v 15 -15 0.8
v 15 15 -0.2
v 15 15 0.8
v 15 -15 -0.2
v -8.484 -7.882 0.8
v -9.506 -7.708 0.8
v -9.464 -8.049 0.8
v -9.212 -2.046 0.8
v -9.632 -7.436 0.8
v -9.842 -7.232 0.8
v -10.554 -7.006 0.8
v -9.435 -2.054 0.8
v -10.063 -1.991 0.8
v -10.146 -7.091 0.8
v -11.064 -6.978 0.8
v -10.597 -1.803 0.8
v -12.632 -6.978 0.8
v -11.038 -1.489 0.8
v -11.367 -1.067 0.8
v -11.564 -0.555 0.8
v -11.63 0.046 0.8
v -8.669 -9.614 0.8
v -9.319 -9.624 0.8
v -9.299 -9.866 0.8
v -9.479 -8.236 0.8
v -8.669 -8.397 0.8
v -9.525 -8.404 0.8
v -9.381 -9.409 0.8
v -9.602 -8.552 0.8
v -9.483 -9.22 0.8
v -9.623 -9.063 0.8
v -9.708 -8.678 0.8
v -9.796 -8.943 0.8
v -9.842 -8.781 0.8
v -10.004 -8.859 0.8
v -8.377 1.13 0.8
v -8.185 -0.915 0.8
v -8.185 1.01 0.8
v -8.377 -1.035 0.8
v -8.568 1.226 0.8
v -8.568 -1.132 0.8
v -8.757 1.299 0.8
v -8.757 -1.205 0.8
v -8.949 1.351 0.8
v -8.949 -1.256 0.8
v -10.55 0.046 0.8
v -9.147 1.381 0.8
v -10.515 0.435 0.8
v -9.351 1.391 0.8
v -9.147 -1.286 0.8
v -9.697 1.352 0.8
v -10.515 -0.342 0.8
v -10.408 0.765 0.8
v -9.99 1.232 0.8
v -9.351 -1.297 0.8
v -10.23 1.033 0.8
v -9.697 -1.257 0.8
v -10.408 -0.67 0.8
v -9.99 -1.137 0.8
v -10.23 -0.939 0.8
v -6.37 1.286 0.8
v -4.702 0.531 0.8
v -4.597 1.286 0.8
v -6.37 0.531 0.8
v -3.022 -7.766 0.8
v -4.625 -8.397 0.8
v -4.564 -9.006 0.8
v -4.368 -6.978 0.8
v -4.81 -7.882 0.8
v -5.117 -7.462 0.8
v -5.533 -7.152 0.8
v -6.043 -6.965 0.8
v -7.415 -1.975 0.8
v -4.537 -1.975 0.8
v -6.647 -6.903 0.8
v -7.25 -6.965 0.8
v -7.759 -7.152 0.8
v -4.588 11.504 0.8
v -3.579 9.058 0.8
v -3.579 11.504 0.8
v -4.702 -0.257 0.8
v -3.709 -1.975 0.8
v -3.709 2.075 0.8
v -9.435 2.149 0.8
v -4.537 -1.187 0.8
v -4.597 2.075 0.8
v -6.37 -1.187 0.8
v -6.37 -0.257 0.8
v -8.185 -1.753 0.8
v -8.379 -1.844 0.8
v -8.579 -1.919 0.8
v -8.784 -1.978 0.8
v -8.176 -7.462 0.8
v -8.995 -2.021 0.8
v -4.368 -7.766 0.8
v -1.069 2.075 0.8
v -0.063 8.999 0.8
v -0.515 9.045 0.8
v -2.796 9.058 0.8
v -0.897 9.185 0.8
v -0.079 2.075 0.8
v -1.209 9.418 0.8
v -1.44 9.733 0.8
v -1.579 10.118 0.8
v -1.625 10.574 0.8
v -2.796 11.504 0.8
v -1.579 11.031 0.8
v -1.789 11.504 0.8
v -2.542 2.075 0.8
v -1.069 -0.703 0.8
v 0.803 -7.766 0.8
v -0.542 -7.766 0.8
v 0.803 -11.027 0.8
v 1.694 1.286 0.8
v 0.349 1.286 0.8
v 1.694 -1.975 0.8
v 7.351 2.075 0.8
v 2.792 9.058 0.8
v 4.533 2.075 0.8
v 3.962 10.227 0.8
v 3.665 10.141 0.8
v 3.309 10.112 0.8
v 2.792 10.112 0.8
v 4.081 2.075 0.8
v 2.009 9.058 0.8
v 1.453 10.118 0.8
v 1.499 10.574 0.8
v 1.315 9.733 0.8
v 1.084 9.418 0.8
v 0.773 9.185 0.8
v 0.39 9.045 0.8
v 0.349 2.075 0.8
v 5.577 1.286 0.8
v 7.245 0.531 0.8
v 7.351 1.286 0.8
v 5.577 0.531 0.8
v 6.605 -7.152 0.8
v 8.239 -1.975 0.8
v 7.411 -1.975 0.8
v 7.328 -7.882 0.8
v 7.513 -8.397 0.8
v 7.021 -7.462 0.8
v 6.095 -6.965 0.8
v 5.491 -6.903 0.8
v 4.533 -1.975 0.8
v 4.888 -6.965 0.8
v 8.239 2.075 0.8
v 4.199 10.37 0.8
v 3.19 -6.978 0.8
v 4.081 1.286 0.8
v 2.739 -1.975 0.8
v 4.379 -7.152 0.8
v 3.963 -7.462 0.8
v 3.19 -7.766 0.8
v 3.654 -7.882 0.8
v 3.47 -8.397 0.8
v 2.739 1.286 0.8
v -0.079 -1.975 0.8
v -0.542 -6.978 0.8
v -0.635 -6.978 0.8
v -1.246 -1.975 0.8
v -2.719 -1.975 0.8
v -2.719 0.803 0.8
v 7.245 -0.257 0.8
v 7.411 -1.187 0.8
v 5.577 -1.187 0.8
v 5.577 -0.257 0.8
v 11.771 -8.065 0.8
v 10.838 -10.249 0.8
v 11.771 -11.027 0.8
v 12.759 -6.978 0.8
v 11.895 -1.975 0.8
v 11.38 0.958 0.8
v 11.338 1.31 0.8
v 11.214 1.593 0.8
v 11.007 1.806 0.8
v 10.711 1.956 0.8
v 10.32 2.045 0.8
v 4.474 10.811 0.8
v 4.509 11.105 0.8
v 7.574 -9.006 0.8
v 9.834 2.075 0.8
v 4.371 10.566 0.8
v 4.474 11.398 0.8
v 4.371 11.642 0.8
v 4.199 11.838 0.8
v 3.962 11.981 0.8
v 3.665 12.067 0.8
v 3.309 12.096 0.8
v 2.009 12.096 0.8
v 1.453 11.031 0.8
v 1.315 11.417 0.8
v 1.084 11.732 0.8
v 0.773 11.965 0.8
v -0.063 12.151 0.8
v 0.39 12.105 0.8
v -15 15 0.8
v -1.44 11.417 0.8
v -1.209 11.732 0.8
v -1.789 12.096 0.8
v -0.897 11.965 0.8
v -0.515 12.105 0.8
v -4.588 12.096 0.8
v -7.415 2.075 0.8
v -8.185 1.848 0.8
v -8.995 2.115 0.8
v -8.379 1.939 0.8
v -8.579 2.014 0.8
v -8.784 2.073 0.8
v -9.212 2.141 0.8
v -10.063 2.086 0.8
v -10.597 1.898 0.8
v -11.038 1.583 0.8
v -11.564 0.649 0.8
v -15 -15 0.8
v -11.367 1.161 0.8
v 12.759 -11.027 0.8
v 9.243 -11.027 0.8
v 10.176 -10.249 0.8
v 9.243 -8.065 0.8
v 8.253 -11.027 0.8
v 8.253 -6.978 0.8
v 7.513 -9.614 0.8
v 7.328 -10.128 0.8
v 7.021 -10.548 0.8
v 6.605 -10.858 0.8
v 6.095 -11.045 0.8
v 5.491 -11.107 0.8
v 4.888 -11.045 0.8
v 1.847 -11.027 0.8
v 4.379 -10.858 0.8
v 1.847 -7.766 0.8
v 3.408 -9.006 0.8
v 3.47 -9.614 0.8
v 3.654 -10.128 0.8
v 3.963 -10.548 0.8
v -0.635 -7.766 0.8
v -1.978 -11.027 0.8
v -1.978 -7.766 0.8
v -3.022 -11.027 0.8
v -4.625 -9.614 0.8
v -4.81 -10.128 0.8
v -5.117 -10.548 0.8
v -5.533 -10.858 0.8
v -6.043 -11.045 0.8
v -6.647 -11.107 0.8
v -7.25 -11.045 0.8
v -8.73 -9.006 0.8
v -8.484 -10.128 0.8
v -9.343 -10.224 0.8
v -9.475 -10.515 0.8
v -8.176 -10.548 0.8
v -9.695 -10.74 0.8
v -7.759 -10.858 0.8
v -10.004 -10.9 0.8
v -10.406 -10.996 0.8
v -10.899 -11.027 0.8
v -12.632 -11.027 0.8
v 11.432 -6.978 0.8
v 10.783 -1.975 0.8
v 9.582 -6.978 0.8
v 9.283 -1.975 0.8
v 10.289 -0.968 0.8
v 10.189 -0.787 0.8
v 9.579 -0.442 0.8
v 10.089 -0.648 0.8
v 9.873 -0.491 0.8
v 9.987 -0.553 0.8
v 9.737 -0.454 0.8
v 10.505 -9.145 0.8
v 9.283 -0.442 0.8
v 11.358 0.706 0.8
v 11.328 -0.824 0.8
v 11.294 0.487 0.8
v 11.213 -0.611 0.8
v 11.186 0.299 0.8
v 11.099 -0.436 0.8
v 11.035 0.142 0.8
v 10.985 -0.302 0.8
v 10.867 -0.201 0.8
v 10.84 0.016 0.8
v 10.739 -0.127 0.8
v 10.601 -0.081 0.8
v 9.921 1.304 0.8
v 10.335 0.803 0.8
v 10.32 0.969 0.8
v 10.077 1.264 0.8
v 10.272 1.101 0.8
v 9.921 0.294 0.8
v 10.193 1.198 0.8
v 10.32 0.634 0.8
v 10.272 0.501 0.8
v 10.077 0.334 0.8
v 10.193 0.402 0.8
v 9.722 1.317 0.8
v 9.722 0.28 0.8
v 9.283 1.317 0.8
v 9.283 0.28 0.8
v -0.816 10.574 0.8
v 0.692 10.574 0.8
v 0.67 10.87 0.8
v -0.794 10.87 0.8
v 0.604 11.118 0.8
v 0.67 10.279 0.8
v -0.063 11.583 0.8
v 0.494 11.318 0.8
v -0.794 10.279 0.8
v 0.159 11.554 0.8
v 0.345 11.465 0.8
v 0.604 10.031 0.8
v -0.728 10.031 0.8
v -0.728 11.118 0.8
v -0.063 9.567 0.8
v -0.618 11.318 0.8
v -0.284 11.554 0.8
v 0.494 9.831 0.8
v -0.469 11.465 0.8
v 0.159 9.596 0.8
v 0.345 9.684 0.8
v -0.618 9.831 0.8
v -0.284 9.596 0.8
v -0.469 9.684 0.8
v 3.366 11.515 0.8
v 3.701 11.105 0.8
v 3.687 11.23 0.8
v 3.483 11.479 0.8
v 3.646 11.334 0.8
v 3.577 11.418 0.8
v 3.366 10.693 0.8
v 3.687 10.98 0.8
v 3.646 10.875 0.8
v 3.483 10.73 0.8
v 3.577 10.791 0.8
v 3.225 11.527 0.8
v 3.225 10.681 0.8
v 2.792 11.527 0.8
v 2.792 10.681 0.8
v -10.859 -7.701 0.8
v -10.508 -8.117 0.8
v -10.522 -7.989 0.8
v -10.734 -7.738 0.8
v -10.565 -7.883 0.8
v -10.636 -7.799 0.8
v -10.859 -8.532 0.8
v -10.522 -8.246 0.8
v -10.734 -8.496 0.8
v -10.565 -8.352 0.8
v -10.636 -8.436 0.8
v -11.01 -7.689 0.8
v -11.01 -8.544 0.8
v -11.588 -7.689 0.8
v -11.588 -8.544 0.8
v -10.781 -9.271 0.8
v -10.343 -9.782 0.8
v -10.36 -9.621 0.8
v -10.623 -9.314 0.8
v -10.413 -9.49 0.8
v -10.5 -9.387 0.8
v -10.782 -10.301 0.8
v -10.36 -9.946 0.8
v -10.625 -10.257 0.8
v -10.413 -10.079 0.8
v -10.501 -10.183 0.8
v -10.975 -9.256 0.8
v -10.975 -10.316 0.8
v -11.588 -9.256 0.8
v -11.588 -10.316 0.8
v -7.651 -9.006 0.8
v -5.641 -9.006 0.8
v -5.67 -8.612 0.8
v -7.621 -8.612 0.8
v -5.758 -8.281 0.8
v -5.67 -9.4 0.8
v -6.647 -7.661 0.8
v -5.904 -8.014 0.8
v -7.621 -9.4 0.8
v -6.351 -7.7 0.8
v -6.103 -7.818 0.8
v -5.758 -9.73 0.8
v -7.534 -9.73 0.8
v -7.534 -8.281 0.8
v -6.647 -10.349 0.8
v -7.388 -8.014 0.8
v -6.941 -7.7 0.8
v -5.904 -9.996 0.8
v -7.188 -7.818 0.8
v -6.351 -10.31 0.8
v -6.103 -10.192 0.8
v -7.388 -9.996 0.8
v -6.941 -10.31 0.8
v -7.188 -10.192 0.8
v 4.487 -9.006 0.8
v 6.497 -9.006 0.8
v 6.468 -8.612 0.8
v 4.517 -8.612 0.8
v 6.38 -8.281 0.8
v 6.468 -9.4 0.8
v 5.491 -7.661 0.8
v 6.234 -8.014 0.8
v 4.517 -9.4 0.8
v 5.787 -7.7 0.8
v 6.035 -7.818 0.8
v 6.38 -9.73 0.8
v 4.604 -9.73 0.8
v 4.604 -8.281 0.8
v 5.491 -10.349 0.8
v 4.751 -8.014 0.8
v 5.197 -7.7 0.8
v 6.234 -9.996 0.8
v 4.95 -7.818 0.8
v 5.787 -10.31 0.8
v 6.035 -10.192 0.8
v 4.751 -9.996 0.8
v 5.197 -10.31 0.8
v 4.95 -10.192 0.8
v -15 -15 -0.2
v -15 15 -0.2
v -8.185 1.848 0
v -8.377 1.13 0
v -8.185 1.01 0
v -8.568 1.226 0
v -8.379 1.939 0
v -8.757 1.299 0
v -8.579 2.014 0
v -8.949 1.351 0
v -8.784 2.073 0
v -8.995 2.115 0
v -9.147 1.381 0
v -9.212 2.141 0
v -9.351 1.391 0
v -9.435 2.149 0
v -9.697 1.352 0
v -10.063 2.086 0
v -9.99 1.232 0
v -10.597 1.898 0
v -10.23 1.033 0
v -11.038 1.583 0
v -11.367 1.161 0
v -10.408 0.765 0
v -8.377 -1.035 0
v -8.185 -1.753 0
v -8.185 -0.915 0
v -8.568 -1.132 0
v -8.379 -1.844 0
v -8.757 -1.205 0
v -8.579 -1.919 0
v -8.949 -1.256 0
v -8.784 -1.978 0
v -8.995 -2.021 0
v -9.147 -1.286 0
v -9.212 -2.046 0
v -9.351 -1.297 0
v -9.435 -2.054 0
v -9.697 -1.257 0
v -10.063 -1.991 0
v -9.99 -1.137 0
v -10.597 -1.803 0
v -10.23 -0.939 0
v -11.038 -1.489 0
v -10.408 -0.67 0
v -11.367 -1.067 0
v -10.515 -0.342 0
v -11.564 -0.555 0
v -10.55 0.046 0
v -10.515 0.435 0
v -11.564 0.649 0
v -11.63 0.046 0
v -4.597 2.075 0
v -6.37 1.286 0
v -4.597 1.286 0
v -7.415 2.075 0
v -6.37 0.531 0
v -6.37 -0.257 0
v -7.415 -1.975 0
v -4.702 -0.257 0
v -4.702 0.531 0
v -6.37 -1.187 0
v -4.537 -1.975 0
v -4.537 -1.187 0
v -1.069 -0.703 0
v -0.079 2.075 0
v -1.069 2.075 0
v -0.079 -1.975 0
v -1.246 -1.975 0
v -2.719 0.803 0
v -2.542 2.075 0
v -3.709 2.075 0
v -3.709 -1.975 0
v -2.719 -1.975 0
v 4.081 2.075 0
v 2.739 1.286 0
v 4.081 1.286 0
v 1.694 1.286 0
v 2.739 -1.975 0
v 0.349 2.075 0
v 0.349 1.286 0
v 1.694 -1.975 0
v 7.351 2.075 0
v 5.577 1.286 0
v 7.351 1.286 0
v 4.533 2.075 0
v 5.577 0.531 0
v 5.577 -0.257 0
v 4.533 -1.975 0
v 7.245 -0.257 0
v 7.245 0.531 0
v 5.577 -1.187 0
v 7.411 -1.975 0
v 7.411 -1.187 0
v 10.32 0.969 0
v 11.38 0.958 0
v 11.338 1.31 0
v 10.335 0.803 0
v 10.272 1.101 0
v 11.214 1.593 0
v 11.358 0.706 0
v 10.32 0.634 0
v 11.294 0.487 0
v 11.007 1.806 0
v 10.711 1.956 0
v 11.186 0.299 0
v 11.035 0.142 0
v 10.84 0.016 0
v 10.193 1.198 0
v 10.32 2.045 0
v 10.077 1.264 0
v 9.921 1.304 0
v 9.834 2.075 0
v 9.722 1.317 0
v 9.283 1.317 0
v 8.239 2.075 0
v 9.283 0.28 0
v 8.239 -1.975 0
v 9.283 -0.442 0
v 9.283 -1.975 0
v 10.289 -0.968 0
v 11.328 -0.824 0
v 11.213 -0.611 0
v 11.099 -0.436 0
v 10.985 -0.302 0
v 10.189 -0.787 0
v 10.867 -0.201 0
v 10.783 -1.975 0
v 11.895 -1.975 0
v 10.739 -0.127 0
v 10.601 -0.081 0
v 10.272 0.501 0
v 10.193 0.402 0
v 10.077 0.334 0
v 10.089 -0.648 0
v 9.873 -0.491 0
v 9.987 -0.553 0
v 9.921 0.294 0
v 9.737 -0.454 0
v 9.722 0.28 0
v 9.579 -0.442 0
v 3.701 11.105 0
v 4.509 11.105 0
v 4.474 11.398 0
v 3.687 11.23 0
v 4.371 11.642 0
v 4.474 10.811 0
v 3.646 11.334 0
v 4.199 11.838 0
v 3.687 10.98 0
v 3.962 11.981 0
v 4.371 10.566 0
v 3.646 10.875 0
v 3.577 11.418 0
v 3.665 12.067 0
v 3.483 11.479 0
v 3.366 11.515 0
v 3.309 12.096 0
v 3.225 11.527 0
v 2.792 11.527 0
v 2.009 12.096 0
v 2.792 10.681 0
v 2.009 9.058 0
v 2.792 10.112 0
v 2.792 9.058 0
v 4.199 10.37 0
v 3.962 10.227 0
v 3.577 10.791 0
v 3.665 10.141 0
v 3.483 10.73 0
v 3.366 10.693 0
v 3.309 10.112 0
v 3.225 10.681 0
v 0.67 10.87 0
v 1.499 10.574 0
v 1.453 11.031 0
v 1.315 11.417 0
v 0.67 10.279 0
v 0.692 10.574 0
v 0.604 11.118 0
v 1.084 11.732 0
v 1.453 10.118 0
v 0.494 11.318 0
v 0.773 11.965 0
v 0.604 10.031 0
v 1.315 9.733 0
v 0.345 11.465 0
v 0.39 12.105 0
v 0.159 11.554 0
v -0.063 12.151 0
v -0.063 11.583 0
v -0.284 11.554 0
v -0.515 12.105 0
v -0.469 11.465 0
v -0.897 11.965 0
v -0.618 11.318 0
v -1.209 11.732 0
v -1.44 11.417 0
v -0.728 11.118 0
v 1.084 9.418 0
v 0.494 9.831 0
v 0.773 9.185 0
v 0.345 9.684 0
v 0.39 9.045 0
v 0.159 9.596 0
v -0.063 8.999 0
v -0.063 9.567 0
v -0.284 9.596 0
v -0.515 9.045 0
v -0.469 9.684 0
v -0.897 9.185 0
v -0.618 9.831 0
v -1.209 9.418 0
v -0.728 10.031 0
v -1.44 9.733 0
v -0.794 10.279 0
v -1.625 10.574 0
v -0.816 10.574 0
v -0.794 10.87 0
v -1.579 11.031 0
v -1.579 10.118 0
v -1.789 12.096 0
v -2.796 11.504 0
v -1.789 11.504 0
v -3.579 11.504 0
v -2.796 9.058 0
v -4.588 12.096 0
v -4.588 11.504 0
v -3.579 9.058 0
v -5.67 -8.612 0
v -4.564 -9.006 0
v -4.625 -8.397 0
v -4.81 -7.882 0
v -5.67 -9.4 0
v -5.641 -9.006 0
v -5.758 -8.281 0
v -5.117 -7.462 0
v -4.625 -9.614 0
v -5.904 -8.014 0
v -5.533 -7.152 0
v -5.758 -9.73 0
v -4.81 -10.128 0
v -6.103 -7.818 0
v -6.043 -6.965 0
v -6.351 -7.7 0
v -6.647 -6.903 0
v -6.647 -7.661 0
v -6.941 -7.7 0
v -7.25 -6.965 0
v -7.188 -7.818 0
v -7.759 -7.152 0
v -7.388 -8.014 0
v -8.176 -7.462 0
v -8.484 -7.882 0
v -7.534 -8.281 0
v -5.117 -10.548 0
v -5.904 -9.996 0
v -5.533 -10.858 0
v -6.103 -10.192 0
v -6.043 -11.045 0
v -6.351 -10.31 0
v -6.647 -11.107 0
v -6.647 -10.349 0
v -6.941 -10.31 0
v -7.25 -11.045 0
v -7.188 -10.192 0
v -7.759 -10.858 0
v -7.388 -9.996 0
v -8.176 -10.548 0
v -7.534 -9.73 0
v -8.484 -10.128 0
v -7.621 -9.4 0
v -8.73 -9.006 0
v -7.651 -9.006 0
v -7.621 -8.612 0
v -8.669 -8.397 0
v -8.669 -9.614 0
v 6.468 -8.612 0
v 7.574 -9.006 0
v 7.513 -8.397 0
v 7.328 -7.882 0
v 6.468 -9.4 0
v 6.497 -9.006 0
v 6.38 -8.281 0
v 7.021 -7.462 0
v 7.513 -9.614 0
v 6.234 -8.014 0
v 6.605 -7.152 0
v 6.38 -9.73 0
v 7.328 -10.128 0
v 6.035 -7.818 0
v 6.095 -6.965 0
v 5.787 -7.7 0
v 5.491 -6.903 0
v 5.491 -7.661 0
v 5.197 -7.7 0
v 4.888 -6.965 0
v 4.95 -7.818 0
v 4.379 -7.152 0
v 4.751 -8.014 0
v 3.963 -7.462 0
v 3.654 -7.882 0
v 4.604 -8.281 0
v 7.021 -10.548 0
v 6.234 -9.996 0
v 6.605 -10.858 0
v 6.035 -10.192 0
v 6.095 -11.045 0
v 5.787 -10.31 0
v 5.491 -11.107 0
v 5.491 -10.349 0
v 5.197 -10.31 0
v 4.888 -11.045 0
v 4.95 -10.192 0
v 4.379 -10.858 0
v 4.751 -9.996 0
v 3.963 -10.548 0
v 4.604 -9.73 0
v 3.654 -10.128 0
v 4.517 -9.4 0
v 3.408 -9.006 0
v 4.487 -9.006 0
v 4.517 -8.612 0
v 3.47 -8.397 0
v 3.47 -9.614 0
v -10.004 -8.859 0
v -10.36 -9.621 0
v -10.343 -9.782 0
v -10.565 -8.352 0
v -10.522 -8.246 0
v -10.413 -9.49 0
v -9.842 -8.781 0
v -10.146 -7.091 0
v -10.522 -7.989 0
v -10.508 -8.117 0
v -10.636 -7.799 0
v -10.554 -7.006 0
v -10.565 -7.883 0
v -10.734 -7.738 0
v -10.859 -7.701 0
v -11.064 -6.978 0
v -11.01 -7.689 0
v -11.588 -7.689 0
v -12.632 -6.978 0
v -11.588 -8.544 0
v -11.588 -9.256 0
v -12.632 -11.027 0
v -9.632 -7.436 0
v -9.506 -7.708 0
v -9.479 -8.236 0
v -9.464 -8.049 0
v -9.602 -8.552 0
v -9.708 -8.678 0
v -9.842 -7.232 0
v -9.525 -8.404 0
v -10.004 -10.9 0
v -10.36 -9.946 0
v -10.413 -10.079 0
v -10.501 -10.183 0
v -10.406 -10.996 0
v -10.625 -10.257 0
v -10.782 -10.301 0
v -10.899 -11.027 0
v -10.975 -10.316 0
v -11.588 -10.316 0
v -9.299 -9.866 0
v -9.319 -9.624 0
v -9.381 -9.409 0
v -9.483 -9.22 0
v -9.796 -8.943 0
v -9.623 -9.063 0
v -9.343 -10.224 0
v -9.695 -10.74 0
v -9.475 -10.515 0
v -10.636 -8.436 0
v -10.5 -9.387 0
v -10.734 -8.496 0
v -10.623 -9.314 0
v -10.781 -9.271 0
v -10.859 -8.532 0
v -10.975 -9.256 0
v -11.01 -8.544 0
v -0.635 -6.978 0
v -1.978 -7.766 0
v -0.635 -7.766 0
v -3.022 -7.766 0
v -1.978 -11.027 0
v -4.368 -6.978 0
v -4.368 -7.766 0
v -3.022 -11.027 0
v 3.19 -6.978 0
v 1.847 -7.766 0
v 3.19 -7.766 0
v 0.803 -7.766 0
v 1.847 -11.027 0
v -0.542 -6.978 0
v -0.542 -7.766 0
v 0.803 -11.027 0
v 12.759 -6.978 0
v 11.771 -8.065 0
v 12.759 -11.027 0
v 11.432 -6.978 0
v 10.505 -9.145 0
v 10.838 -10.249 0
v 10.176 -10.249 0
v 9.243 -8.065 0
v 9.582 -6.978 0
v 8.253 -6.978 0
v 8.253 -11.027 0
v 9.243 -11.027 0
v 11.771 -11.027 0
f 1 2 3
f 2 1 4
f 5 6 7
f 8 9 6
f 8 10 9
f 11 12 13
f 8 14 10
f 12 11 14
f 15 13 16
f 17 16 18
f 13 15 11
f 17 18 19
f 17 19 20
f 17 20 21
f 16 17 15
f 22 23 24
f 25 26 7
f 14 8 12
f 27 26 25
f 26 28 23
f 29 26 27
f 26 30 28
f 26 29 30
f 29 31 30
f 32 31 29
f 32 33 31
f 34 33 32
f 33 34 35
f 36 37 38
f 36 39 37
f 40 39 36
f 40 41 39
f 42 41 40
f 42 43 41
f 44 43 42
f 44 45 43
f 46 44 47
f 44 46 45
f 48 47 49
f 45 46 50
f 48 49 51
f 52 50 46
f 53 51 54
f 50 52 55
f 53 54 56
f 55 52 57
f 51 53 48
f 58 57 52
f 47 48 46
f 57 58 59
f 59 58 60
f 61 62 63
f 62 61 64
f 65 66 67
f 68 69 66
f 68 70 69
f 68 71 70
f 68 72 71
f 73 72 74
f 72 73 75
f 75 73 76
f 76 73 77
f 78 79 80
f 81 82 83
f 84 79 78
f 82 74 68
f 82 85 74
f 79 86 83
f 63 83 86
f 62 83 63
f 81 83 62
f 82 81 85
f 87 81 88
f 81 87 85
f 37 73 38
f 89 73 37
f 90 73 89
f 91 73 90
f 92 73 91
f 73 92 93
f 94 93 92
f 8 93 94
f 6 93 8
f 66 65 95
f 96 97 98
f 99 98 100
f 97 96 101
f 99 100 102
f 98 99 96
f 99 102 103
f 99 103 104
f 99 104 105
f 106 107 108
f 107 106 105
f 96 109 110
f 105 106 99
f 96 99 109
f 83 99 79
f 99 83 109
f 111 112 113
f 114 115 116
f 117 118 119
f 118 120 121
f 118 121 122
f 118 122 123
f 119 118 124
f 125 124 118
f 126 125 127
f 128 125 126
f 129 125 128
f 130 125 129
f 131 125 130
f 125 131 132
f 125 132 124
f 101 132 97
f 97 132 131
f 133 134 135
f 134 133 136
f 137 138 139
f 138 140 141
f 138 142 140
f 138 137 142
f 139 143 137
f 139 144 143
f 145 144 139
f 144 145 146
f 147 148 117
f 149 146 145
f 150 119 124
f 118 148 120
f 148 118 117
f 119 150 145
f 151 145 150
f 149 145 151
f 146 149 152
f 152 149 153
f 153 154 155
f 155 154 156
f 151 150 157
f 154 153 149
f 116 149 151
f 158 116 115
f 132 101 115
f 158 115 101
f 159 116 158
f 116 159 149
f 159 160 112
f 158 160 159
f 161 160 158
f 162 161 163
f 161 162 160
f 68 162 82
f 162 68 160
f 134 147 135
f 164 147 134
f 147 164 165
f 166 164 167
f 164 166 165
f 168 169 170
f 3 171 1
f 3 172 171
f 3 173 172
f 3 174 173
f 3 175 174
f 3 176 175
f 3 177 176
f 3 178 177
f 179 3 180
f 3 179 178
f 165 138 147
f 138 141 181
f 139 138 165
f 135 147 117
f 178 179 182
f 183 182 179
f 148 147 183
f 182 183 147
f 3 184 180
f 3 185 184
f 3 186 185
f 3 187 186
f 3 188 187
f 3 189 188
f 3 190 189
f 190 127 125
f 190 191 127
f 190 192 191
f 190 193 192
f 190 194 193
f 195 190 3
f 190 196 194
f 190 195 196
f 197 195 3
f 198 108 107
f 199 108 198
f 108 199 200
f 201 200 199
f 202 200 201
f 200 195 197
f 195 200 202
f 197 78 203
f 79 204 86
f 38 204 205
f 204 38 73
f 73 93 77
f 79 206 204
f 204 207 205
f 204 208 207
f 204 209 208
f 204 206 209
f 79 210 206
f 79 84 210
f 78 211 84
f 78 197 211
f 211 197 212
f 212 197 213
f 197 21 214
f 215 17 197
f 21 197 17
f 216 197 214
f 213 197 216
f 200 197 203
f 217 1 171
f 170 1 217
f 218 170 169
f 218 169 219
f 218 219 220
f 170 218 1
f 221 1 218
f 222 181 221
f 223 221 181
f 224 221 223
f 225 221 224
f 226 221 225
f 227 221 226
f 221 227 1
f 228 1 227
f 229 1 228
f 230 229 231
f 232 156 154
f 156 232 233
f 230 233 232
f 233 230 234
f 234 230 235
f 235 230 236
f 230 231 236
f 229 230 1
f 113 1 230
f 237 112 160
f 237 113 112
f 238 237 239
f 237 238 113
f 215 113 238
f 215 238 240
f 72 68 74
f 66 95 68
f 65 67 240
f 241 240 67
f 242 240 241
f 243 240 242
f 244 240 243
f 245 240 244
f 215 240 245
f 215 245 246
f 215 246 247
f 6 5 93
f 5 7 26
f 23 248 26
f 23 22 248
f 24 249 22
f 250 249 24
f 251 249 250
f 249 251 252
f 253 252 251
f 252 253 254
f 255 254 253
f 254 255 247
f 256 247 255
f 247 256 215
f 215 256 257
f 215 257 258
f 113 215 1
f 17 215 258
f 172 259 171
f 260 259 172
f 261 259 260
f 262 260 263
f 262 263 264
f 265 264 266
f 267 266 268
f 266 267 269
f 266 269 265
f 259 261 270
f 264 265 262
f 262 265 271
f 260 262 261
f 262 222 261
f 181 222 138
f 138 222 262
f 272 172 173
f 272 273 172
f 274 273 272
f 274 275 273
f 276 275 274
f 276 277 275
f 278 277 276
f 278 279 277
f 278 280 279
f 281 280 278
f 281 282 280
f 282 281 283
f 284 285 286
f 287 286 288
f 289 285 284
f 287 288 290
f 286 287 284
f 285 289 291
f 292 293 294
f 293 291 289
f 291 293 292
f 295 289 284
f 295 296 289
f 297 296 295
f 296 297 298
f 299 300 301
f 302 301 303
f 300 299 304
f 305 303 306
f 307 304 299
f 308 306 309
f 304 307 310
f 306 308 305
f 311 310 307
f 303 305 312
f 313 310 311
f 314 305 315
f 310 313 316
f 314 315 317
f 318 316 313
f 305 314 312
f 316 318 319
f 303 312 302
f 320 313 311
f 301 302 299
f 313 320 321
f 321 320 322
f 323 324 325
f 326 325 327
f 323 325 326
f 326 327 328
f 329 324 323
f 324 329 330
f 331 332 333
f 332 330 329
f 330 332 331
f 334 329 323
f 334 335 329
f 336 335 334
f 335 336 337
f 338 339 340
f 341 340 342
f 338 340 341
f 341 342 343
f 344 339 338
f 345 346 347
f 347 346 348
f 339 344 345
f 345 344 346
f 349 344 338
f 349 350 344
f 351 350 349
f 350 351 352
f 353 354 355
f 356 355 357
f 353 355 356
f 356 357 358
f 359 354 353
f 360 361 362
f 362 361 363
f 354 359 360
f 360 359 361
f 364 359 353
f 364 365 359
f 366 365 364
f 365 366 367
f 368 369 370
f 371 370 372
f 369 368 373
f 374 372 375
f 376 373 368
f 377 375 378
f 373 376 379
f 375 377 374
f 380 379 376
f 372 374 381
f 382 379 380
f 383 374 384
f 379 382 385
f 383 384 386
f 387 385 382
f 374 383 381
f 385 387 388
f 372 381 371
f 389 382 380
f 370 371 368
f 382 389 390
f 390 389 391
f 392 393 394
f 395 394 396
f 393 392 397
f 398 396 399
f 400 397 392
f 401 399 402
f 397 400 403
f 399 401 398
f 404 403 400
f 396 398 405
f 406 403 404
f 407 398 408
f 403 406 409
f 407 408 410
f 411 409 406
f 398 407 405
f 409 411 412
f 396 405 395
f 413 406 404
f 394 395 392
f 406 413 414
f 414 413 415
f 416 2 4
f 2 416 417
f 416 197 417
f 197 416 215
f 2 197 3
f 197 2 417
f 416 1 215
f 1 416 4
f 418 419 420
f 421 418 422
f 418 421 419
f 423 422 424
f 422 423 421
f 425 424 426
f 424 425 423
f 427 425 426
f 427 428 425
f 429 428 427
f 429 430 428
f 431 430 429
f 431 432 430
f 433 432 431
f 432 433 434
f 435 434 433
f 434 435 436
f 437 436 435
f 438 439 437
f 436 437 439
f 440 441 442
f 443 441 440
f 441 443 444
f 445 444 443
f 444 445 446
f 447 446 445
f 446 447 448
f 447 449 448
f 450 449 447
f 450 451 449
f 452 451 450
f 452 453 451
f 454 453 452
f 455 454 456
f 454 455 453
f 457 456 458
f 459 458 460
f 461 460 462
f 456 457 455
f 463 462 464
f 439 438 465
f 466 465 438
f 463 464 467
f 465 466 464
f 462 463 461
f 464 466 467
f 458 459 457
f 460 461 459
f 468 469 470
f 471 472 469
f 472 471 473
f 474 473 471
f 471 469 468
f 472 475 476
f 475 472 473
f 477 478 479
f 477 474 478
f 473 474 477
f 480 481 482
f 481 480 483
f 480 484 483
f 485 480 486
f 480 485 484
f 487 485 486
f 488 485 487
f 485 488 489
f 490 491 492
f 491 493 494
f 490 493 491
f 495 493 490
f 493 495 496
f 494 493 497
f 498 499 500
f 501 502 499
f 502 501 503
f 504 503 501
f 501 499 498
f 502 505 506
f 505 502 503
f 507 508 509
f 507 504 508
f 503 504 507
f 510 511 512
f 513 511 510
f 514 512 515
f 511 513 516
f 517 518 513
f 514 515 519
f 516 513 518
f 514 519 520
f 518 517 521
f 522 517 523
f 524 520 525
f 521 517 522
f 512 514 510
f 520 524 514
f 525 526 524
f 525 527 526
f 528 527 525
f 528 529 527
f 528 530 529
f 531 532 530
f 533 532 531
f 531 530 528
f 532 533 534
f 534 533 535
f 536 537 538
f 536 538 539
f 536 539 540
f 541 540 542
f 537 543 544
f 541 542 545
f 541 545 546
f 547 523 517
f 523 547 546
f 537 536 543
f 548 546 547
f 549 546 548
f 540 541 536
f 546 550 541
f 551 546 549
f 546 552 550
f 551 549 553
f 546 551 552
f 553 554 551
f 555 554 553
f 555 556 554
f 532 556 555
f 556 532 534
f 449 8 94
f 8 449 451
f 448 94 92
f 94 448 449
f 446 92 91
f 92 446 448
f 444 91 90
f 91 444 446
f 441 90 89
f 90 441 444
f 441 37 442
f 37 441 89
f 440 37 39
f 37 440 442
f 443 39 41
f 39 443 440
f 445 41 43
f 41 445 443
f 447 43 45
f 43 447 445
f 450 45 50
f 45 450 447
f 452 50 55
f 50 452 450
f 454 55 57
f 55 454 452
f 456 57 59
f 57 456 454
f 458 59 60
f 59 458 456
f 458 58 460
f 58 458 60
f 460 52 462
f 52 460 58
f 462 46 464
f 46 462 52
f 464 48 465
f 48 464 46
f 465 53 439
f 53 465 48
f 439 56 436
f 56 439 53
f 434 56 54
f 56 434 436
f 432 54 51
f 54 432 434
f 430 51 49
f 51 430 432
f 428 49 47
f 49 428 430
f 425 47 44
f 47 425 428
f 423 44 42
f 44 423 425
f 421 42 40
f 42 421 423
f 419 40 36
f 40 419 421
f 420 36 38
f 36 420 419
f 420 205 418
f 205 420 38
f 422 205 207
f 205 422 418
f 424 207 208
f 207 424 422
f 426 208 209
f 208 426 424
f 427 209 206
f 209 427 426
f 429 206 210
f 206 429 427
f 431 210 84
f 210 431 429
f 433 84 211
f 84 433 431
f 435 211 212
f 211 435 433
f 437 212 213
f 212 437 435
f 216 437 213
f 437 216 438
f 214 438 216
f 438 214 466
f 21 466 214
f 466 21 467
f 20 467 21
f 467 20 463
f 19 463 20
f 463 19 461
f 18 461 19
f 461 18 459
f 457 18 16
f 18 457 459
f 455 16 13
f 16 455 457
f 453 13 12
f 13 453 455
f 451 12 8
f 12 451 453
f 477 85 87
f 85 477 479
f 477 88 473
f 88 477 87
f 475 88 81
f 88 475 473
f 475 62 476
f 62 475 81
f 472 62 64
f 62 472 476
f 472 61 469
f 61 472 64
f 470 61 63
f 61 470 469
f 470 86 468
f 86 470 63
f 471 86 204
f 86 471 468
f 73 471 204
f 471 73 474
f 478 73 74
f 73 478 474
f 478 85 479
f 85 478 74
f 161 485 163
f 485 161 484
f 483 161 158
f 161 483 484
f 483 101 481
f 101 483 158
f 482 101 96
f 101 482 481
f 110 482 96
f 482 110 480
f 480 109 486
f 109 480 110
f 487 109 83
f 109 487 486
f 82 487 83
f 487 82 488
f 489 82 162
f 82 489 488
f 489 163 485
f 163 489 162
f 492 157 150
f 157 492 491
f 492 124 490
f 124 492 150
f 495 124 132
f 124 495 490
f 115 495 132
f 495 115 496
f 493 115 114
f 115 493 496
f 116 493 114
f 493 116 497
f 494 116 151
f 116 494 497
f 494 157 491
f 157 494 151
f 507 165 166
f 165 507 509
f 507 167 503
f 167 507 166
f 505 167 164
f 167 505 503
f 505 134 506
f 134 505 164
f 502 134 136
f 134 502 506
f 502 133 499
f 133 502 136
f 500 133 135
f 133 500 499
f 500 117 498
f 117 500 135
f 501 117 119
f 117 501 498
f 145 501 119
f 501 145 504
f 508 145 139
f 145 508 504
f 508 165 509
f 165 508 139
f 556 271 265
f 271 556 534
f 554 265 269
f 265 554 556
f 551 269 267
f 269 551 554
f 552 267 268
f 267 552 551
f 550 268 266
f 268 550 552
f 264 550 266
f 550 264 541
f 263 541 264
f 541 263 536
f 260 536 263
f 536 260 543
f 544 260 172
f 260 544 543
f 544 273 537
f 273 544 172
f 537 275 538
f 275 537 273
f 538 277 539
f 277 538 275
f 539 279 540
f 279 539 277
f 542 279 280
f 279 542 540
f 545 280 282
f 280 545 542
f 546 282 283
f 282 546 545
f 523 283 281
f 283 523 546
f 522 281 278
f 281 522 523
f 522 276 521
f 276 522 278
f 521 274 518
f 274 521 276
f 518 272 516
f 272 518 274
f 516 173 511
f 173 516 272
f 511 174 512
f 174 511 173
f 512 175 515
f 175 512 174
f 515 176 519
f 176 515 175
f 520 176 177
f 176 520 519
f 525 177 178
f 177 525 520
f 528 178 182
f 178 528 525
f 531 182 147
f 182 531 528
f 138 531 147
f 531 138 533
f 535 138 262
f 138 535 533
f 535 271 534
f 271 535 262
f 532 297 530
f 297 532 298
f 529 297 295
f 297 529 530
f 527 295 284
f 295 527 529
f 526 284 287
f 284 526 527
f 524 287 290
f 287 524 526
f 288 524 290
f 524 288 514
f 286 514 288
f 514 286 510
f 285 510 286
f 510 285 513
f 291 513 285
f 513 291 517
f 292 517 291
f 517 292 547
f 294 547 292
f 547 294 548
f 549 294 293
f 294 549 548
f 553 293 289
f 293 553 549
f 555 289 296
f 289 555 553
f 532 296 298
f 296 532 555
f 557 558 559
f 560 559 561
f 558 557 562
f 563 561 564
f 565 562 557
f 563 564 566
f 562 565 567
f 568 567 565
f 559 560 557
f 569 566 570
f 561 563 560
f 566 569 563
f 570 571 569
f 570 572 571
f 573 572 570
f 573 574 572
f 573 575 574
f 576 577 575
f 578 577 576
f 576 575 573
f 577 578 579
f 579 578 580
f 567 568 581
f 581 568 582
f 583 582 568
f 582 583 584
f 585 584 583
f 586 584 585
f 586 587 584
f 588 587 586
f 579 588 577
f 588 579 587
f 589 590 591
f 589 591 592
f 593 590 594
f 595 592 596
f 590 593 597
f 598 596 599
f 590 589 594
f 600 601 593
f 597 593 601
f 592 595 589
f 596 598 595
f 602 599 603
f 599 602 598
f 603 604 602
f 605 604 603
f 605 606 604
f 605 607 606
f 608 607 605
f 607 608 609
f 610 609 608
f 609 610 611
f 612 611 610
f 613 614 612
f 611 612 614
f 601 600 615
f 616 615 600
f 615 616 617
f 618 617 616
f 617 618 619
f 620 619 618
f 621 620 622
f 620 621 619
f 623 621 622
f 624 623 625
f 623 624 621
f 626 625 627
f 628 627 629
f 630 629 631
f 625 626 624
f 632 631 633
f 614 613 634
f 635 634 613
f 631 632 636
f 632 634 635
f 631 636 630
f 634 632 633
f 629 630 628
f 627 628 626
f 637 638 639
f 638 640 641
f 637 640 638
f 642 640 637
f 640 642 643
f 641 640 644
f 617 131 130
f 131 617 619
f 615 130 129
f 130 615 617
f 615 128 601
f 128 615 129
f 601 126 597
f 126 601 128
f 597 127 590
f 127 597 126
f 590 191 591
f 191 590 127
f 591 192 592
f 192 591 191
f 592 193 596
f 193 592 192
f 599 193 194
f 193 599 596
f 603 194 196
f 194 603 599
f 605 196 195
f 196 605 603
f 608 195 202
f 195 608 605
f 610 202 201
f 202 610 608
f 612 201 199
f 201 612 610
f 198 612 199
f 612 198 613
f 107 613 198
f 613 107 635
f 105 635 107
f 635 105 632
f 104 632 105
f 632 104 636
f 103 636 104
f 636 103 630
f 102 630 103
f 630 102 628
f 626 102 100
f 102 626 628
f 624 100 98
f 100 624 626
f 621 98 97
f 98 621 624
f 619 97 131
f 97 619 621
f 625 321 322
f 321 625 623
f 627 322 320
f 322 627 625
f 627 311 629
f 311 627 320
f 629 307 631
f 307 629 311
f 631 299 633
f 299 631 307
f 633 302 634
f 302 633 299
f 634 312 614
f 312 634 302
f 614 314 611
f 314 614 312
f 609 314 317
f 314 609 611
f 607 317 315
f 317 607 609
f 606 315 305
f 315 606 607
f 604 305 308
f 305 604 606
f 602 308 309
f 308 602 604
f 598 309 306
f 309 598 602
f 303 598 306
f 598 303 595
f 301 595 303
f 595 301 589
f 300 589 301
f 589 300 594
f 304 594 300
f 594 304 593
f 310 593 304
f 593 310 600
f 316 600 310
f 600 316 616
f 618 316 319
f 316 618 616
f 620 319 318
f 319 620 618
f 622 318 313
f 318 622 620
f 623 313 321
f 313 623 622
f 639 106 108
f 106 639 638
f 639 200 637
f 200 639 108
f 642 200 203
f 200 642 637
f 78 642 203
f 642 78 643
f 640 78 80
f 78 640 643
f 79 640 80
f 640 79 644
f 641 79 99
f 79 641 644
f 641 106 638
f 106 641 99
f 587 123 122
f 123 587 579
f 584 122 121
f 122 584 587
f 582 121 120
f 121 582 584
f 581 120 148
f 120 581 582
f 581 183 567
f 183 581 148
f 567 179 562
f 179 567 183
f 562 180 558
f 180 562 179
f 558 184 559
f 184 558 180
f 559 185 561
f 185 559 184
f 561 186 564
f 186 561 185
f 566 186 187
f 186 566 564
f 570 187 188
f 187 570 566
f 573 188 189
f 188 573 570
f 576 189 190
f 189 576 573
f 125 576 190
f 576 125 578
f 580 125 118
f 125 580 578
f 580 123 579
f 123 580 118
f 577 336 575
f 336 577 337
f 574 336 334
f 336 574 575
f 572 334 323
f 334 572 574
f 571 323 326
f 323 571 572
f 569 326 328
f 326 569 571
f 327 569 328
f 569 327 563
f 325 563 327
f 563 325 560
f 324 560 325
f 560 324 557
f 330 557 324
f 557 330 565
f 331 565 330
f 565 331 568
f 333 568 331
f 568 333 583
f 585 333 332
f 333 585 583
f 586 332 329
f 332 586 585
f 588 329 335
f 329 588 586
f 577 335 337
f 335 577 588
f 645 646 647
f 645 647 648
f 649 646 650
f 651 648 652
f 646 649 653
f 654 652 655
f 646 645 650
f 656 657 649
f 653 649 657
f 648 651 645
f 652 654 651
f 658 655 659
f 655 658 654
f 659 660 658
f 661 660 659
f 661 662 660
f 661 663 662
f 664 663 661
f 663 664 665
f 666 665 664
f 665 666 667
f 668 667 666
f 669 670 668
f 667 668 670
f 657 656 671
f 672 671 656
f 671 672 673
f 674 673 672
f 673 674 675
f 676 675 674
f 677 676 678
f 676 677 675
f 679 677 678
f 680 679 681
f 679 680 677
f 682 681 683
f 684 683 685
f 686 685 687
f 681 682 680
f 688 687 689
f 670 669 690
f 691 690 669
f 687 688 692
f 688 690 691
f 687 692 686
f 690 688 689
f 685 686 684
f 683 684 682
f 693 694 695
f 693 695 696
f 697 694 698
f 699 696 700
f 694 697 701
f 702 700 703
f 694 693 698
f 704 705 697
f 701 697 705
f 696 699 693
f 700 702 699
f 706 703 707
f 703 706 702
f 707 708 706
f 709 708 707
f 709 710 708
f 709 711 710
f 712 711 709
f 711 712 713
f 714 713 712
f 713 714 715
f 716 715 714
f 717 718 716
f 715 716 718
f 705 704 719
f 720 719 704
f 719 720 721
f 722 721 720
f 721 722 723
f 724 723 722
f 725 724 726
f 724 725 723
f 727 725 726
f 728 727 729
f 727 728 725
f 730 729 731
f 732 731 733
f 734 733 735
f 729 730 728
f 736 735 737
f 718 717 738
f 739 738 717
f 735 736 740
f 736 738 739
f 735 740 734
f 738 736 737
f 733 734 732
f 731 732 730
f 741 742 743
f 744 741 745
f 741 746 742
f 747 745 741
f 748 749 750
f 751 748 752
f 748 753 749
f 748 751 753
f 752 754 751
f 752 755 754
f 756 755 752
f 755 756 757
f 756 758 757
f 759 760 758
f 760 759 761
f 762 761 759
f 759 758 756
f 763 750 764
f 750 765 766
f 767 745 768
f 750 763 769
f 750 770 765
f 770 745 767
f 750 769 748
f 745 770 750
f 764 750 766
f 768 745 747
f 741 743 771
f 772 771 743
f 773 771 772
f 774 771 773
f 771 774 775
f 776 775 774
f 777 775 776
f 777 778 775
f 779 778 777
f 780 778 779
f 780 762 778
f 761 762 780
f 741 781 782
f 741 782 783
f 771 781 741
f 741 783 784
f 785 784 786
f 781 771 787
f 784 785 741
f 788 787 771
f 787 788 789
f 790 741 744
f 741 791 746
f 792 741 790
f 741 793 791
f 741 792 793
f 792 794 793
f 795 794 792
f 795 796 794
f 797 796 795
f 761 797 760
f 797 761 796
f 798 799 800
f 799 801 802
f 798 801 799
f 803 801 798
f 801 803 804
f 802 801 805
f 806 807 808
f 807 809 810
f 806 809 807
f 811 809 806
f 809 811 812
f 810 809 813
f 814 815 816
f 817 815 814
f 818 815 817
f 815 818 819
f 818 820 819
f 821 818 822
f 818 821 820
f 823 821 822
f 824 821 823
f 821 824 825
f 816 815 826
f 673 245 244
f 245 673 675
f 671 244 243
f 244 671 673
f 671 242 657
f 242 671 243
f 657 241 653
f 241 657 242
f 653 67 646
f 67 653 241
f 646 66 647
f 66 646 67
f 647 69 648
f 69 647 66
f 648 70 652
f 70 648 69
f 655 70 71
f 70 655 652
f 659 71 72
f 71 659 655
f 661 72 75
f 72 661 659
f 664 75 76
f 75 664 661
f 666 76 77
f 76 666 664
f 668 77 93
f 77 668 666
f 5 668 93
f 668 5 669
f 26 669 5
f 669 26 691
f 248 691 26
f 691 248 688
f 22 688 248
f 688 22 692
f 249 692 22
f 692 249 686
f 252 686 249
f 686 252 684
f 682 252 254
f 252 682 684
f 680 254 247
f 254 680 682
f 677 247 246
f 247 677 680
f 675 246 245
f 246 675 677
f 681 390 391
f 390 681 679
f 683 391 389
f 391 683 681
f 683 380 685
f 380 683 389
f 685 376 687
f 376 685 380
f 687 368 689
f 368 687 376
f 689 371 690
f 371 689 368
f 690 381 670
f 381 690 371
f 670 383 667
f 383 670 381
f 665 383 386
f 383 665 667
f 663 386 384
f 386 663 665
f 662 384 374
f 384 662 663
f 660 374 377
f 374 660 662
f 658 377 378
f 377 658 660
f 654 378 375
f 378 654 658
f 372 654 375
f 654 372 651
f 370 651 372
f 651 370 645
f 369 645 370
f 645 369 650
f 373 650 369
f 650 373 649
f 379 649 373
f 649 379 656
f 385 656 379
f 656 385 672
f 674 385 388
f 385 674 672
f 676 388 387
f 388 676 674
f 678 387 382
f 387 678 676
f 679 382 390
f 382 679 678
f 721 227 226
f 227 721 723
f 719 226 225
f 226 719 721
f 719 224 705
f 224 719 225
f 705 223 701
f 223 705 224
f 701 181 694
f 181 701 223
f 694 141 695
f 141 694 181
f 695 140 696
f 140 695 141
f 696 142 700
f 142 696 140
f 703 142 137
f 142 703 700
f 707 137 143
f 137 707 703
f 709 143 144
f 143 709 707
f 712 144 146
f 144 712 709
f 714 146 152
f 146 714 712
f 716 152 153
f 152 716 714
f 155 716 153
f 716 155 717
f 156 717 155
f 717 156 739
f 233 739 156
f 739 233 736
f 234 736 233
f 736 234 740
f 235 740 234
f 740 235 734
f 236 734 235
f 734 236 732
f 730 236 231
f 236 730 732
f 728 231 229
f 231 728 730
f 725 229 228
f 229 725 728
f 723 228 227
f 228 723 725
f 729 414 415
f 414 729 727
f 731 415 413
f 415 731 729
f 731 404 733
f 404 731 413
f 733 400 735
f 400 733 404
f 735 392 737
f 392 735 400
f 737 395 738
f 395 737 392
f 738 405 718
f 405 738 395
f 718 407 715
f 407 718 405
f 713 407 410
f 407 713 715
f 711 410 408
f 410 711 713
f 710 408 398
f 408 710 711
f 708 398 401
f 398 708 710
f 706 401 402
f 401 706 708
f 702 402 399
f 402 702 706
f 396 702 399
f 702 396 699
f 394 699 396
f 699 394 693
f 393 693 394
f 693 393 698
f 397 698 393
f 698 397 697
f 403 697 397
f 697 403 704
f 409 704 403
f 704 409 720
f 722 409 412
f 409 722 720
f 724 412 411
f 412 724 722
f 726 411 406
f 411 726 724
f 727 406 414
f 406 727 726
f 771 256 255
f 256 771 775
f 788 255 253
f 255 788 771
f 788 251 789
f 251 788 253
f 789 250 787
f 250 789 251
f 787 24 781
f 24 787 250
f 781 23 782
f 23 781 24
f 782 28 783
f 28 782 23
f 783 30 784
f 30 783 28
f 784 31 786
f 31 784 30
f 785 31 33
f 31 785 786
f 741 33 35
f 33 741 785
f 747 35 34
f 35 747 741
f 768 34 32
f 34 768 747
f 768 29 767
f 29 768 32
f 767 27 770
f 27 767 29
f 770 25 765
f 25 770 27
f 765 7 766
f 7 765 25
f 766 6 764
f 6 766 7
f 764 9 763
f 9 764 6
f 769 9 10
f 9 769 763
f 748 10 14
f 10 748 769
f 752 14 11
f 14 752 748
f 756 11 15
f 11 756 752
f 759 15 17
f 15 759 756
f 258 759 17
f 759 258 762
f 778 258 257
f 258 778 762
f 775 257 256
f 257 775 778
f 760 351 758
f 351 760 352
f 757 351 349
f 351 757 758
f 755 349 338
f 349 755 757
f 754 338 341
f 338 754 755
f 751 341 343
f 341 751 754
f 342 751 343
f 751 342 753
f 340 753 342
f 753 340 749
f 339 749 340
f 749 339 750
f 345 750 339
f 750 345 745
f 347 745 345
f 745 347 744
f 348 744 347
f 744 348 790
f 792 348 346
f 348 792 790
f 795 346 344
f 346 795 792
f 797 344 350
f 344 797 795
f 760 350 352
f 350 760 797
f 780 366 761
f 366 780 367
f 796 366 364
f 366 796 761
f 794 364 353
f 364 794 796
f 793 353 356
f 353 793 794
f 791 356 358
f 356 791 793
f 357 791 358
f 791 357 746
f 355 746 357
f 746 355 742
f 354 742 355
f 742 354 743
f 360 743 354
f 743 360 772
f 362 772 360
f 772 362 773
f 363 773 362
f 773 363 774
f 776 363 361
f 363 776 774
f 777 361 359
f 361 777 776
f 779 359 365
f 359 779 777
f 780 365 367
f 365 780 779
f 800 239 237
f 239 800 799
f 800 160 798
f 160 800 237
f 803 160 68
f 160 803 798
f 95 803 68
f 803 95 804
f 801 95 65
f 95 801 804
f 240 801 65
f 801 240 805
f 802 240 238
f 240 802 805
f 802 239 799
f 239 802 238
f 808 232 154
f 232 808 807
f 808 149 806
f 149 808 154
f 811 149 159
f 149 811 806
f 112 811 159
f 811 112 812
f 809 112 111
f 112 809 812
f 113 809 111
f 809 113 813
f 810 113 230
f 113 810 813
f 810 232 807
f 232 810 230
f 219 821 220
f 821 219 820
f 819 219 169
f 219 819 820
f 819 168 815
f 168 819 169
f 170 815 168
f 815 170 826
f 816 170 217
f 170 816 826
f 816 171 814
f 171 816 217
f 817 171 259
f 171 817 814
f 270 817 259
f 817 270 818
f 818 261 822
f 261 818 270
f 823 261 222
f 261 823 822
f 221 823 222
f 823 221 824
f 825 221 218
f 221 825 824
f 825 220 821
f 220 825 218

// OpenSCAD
//Decision Cube

//Emboss or raised text. Set to 1 for embossed text.
emboss = 1;//[0:1:1]

//Text here appears on the top
text_top = "TOP";
//Size of the top text
size_top = 3;//[2:1:16]
//Vertical position of top text
top_position = 9;//[0:1:11]

//Text here appears on the center
text_center = "CENTER";
//Size of the center text
size_center = 4;//[2:1:16]

//Text here appears on the bottom
text_bottom = "BOTTOM";
//Size of the bottom text
size_bottom = 4;//[2:1:16]
//Vertical position of bottom text
bottom_position = -7;//[-11:1:0]

//Font. Type in the font name
font_family = "Comic Sans MS";
// Font weight. bold/italic/light
font_weight = "bold";

//Resolution. 
resolution = 20;//[10:10:100]

if (emboss==1); else {
    
translate([0,0,-0.5])
cube([30,30,1],center=true);
linear_extrude(height=1) {
text(
    text_center,
    font = str(font_family, ":style=", font_weight),
    size=size_center,
    halign="center",
    valign="center");
}
translate ([0,top_position,0])
linear_extrude(height=1) {
text(
    text_top,
    font = str(font_family, ":style=", font_weight),
    size=size_top,
    halign="center",
    valign="bottom");
}
translate ([0,bottom_position,0])
linear_extrude(height=1) {
text(
    text_bottom,
    font = str(font_family, ":style=", font_weight),
    size=size_bottom,
    halign="center",
    valign="top");
}
}

difference () {
    
translate([0,0,-0.7+emboss])
cube([30,30,1],center=true);
linear_extrude(height=1) {
text(
    text_center,
    font = str(font_family, ":style=", font_weight),
    size=size_center,
    halign="center",
    valign="center");
}
translate ([0,top_position,0])
linear_extrude(height=1) {
text(
    text_top,
    font = str(font_family, ":style=", font_weight),
    size=size_top,
    halign="center",
    valign="bottom");
}
translate ([0,bottom_position,0])
linear_extrude(height=1) {
text(
    text_bottom,
    font = str(font_family, ":style=", font_weight),
    size=size_bottom,
    halign="center",
    valign="top");
}
}
$fn=resolution;
